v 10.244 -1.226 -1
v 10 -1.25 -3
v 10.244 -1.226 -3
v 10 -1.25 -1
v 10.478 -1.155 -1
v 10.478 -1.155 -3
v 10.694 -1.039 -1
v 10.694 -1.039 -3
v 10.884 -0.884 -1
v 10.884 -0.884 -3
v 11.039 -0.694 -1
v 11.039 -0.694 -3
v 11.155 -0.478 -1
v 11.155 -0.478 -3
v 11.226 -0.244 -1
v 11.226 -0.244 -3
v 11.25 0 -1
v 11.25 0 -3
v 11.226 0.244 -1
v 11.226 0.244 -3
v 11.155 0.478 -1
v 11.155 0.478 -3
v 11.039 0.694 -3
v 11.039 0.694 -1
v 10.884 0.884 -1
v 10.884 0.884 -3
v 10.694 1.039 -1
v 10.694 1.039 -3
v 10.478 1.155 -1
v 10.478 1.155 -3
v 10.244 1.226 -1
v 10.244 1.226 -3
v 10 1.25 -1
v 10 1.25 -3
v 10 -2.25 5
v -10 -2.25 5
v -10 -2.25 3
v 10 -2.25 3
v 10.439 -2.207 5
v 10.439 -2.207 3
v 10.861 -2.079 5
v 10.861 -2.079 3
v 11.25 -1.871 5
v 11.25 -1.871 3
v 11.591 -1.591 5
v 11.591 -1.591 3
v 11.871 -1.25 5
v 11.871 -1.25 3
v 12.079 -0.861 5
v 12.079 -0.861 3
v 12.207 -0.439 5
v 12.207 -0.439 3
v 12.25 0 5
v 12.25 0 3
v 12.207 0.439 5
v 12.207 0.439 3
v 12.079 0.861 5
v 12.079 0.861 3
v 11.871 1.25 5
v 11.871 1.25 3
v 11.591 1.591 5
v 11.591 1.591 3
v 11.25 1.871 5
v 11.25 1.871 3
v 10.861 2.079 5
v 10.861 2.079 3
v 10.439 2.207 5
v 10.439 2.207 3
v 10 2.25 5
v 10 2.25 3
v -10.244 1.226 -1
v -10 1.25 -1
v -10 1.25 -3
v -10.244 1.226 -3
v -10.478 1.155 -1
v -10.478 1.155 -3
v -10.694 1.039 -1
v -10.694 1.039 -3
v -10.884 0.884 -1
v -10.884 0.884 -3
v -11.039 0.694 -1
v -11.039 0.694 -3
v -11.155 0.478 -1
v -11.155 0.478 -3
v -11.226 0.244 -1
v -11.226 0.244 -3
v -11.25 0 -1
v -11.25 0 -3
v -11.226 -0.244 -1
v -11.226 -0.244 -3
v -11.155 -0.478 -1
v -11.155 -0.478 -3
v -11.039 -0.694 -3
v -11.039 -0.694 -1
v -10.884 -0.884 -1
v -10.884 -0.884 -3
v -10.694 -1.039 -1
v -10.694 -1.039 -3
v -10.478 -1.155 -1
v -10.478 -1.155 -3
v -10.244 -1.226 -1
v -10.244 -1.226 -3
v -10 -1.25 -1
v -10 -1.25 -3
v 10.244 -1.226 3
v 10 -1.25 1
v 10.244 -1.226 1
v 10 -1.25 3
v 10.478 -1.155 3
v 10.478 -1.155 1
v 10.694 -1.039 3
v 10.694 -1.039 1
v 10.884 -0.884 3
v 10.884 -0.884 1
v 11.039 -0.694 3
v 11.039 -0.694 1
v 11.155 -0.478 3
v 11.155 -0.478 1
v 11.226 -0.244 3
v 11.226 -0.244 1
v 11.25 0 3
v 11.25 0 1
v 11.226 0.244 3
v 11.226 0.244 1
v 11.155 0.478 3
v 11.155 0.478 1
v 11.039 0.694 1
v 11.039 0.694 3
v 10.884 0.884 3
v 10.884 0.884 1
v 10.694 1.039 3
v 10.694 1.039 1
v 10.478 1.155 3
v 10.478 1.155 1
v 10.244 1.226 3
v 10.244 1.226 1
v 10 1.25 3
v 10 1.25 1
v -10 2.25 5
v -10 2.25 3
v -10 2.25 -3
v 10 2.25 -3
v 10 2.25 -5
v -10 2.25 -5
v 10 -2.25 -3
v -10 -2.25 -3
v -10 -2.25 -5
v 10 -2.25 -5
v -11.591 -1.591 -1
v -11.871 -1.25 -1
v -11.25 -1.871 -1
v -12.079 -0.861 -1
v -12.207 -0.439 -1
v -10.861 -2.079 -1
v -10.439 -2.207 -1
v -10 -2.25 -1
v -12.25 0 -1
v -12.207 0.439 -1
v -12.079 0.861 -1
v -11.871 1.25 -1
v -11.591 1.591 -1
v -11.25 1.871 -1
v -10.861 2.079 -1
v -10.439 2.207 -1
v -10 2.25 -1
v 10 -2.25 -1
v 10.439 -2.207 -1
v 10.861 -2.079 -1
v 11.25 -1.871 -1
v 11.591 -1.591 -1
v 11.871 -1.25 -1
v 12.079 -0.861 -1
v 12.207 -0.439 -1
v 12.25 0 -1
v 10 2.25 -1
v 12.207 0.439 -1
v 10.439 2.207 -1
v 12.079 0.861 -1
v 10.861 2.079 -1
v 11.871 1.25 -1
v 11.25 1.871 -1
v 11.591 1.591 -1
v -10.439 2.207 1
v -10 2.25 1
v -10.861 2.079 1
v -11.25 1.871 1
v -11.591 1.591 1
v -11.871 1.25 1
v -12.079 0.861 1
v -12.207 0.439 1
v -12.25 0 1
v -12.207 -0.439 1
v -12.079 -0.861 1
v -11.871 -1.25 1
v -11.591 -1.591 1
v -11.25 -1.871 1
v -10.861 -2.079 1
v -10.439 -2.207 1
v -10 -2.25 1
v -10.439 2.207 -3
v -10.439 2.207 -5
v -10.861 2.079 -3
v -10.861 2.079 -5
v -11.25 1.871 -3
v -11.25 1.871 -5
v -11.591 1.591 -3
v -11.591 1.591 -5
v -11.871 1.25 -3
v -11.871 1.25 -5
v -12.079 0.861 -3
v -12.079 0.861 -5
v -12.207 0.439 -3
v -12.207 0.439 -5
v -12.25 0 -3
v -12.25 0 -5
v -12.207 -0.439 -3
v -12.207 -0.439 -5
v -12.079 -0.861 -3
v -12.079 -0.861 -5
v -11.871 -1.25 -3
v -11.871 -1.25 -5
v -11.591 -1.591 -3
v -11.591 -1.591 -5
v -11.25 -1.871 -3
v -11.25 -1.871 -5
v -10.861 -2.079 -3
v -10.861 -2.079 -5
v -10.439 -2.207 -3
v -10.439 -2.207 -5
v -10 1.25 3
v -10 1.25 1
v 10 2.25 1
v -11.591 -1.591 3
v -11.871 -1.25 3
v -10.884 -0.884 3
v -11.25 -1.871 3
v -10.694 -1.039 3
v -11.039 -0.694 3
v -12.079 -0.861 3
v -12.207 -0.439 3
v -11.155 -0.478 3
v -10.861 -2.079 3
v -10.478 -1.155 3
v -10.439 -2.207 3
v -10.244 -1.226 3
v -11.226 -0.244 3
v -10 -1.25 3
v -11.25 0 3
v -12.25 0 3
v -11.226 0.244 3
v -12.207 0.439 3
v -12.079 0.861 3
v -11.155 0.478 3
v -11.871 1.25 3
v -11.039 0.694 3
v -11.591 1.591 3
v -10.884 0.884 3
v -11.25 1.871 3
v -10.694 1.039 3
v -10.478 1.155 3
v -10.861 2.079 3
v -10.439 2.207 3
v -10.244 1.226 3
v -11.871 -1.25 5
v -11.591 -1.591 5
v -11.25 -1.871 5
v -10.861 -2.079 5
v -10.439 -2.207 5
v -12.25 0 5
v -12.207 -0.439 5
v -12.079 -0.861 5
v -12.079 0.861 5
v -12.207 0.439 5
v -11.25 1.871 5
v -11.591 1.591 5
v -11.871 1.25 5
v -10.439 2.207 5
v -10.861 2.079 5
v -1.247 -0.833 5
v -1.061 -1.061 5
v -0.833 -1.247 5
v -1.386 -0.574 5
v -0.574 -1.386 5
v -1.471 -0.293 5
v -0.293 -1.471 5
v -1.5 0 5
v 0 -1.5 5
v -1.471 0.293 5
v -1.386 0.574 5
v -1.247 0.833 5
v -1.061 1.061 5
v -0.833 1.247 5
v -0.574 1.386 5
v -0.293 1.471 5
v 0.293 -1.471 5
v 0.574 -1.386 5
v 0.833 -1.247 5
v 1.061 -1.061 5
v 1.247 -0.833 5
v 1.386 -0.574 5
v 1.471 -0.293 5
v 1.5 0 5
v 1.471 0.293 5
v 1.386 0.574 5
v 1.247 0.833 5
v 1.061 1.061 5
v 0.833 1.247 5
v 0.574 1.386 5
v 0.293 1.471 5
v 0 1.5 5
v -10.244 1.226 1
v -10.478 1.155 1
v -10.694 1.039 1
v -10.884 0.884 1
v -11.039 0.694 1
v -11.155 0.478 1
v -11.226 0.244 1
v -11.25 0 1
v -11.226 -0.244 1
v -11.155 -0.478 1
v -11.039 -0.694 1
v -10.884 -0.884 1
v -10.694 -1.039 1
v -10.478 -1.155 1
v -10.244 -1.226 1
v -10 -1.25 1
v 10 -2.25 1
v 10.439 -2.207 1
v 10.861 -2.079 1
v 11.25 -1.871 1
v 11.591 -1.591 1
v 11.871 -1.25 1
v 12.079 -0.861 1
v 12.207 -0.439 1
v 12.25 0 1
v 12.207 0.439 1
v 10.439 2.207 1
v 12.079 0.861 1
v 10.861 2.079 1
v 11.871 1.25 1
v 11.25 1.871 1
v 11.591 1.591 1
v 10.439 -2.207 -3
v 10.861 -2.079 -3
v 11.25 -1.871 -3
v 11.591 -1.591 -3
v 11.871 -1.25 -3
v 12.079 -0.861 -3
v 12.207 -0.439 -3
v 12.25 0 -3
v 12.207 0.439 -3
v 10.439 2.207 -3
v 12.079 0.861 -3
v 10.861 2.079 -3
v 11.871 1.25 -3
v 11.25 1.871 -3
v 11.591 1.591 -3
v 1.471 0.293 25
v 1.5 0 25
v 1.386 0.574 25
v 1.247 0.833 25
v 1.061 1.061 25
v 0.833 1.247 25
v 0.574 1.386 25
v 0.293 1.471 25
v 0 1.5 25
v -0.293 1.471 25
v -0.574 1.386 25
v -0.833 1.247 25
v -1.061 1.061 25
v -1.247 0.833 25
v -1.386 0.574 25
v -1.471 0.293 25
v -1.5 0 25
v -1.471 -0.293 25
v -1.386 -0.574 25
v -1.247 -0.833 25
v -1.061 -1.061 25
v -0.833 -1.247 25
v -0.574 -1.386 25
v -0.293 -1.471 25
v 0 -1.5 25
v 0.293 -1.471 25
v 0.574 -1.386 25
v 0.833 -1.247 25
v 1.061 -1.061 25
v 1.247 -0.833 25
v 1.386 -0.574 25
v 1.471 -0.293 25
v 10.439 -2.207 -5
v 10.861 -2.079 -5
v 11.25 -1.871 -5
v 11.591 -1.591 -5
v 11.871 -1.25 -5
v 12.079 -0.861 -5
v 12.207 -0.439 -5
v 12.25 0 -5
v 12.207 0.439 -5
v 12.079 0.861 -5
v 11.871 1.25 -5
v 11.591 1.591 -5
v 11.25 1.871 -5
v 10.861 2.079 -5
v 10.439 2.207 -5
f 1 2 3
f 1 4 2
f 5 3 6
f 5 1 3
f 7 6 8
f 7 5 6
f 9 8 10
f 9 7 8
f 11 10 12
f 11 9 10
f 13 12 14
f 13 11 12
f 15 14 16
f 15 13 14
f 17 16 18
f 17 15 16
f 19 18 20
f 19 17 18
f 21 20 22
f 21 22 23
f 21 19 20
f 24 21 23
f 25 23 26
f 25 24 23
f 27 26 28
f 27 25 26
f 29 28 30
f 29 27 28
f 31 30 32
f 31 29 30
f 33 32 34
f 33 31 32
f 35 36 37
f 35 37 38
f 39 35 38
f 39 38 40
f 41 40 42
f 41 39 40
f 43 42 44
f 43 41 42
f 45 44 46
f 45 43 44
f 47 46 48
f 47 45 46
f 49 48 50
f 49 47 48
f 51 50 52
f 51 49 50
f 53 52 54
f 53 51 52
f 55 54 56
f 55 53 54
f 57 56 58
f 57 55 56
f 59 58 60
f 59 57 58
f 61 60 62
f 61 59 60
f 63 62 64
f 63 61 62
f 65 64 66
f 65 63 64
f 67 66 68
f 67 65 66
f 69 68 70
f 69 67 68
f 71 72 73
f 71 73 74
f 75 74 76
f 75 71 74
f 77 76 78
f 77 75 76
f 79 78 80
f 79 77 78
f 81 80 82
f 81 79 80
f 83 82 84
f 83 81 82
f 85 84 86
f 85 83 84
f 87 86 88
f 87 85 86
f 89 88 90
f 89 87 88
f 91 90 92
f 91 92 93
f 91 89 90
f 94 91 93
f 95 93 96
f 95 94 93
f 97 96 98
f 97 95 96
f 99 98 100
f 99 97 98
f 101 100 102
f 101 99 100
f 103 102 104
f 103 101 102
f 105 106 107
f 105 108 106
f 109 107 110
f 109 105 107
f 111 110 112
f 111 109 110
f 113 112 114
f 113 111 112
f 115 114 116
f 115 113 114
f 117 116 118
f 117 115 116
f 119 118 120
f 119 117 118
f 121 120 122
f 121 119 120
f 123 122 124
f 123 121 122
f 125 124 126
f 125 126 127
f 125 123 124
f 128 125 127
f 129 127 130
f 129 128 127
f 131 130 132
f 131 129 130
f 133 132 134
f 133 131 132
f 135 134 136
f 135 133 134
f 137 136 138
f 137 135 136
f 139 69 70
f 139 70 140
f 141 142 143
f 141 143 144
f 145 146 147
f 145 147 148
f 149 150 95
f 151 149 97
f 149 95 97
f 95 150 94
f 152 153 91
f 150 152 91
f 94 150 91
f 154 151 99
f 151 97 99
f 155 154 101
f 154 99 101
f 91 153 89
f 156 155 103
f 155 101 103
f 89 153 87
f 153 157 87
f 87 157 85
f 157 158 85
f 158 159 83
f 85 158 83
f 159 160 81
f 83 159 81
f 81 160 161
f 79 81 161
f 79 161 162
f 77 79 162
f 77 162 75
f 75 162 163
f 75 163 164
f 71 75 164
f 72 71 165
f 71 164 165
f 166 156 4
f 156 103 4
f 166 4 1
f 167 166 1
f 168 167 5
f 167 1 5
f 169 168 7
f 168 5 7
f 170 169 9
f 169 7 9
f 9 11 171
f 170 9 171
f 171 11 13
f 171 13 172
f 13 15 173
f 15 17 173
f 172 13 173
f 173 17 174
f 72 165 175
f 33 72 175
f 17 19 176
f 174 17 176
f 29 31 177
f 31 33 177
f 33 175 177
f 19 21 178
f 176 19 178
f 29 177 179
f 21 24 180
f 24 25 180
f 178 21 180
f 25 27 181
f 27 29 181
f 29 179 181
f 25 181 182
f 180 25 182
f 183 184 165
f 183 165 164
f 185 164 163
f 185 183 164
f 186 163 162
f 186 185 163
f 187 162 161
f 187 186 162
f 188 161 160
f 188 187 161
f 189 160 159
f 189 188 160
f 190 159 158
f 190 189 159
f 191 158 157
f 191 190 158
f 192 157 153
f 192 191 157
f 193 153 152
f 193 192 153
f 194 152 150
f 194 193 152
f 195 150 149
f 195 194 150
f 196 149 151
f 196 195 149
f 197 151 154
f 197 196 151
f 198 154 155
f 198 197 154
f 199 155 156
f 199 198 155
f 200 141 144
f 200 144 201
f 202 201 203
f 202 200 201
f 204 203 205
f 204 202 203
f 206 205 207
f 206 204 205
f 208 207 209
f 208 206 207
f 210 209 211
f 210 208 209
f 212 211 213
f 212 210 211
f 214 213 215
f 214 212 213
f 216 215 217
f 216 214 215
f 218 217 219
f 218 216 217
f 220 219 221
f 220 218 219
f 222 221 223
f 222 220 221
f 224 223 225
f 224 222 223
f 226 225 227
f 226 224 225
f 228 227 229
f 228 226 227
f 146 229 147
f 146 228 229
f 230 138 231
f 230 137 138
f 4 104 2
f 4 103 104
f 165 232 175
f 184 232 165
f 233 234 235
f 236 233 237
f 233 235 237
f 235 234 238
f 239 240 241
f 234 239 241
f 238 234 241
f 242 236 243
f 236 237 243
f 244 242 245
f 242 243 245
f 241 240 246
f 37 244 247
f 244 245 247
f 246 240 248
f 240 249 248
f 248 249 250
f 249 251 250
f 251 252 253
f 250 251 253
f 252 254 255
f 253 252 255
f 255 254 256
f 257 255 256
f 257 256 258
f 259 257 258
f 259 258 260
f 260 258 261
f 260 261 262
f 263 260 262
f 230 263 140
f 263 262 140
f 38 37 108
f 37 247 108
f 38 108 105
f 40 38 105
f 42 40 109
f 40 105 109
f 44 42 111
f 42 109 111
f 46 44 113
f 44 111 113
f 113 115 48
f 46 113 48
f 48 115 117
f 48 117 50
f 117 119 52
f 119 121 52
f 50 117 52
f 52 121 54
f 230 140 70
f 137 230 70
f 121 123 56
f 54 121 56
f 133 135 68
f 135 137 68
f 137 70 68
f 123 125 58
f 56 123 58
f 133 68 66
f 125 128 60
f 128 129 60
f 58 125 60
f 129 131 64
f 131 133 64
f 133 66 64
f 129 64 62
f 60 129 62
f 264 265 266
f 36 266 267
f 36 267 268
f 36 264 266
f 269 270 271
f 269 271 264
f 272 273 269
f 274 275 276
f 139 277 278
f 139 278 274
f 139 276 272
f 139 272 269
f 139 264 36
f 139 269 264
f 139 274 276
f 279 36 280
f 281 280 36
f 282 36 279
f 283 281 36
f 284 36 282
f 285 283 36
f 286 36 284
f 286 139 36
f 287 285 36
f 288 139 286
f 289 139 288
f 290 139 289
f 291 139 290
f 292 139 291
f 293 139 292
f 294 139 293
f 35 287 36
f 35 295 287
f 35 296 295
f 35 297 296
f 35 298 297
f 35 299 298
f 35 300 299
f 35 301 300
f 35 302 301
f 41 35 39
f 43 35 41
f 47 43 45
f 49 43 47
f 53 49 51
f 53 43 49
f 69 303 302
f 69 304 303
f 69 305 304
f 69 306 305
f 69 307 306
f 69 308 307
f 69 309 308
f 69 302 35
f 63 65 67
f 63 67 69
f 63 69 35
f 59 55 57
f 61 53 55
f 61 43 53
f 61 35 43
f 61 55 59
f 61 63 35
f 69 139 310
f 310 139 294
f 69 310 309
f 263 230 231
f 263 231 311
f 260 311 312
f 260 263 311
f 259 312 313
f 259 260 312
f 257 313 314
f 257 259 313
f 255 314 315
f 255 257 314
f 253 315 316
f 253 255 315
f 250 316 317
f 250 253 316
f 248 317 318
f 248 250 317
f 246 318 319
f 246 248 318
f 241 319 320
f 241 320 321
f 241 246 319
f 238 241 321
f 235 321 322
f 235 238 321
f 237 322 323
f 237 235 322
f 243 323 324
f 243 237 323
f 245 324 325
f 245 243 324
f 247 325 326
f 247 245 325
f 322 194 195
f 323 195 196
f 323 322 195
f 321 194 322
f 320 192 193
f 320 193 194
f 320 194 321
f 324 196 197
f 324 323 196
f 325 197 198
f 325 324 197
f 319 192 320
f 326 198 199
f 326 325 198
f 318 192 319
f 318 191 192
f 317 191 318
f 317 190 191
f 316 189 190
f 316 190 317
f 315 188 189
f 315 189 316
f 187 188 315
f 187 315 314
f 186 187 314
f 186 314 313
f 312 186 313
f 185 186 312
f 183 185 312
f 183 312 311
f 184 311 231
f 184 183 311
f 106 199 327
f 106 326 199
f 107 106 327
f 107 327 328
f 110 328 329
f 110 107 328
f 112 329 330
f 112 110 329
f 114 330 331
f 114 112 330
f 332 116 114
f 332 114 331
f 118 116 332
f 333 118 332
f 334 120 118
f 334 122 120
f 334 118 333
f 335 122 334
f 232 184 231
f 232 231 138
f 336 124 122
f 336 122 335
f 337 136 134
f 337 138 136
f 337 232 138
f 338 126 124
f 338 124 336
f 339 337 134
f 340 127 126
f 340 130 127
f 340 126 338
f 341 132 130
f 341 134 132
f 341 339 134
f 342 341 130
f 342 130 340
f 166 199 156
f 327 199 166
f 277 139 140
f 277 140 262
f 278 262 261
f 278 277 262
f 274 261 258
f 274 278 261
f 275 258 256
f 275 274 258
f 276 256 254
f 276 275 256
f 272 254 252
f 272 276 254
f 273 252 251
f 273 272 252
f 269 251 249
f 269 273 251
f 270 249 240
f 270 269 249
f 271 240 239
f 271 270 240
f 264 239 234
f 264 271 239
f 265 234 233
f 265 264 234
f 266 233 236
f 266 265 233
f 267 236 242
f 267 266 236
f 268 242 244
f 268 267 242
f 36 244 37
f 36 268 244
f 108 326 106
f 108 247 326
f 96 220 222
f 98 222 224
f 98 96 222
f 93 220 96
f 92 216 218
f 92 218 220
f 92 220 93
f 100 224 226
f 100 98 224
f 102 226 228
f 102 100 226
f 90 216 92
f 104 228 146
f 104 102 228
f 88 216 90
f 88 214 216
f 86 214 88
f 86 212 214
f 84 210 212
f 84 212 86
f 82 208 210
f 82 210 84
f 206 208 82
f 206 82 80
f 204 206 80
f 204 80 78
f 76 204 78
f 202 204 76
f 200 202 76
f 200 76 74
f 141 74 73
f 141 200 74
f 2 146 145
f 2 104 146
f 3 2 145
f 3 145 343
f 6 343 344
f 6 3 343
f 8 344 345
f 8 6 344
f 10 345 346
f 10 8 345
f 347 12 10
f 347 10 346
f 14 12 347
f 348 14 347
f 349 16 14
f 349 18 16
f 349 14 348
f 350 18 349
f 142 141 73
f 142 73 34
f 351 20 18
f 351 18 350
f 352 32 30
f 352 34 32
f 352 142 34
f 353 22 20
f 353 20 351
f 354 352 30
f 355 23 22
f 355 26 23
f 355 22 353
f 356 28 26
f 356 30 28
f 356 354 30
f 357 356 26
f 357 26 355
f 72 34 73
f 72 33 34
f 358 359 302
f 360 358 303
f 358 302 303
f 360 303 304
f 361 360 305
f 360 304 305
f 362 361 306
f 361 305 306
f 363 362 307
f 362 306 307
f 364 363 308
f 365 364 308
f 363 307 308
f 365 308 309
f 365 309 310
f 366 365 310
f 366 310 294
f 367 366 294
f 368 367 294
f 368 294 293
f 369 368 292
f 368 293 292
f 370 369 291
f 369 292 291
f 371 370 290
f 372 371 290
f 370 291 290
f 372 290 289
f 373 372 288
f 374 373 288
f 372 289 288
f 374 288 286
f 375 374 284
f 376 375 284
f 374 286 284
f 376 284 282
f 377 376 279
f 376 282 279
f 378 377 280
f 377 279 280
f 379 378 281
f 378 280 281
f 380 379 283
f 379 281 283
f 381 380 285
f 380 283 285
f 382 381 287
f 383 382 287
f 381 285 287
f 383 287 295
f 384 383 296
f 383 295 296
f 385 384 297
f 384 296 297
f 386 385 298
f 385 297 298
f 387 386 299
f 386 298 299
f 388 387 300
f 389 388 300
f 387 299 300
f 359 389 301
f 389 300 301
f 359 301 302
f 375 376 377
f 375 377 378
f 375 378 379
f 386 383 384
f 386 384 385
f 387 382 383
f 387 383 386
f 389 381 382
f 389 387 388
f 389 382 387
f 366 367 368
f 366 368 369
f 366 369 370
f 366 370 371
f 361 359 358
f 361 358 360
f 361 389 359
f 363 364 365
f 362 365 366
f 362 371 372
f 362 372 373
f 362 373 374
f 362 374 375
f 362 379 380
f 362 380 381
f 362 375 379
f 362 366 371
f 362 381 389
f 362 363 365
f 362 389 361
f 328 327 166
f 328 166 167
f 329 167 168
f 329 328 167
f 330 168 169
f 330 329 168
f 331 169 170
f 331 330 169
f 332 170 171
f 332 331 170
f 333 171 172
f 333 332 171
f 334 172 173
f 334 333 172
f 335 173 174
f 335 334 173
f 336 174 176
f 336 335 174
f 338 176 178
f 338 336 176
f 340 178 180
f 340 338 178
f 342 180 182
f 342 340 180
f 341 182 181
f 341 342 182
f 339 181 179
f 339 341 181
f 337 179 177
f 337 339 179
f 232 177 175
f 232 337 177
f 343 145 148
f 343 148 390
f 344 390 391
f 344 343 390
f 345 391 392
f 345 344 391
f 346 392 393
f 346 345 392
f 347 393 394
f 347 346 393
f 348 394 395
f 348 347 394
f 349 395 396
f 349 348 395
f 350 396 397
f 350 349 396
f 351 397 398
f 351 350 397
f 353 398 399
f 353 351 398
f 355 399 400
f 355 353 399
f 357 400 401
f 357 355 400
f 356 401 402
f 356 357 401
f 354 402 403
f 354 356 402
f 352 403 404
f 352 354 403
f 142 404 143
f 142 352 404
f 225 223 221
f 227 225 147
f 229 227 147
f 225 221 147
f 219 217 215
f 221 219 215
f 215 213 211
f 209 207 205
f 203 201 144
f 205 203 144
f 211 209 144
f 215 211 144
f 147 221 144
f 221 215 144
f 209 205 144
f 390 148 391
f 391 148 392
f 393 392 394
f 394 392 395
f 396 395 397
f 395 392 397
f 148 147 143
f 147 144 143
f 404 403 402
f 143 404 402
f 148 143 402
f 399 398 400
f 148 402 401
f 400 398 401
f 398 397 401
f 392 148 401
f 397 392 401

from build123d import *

# Parameters (mm, degrees)
BOSS_EXTRUDE1_DEPTH = 5
SKETCH4_R           = 1.5
BOSS_EXTRUDE3_DEPTH = 20
CUT_EXTRUDE2_START  = 2
CUT_EXTRUDE2_DEPTH  = 1
CUT_EXTRUDE4_START  = -2
CUT_EXTRUDE4_DEPTH  = 1


with BuildPart() as part:
    # Sketch1 → Boss-Extrude1 (new, symmetric)
    with BuildSketch(Plane.XY):
        with BuildLine():
            Line((10, 2.25), (-10, 2.25))
            ThreePointArc((-10, 2.25), (-12.25, 0), (-10, -2.25))
            Line((-10, -2.25), (10, -2.25))
            ThreePointArc((10, -2.25), (12.25, 0), (10, 2.25))
        make_face()
    extrude(amount=BOSS_EXTRUDE1_DEPTH, both=True)

    # Sketch4 → Boss-Extrude3 (add)
    with BuildSketch(Plane.XY.offset(5)):
        Circle(SKETCH4_R)
    extrude(amount=BOSS_EXTRUDE3_DEPTH)

    # Sketch1<4> → Cut-Extrude2 (cut, symmetric)
    with BuildSketch(Plane.XY.offset(CUT_EXTRUDE2_START)):
        with BuildLine():
            Line((0, 2.25), (-10, 2.25))
            ThreePointArc((-10, 2.25), (-12.25, 0), (-10, -2.25))
            Line((-10, -2.25), (0, -2.25))
            Line((0, -2.25), (10, -2.25))
            ThreePointArc((10, -2.25), (12.25, 0), (10, 2.25))
            Line((10, 2.25), (0, 2.25))
        make_face()
        with BuildLine():
            Line((0, 1.25), (-10, 1.25))
            ThreePointArc((-10, 1.25), (-11.25, 0), (-10, -1.25))
            Line((-10, -1.25), (0, -1.25))
            Line((0, -1.25), (10, -1.25))
            ThreePointArc((10, -1.25), (11.25, 0), (10, 1.25))
            Line((10, 1.25), (0, 1.25))
        make_face(mode=Mode.SUBTRACT)
    extrude(amount=CUT_EXTRUDE2_DEPTH, both=True, mode=Mode.SUBTRACT)

    # Sketch1<6> → Cut-Extrude4 (cut, symmetric)
    with BuildSketch(Plane.XY.offset(CUT_EXTRUDE4_START)):
        with BuildLine():
            Line((0, 2.25), (-10, 2.25))
            ThreePointArc((-10, 2.25), (-12.25, 0), (-10, -2.25))
            Line((-10, -2.25), (0, -2.25))
            Line((0, -2.25), (10, -2.25))
            ThreePointArc((10, -2.25), (12.25, 0), (10, 2.25))
            Line((10, 2.25), (0, 2.25))
        make_face()
        with BuildLine():
            Line((0, 1.25), (-10, 1.25))
            ThreePointArc((-10, 1.25), (-11.25, 0), (-10, -1.25))
            Line((-10, -1.25), (0, -1.25))
            Line((0, -1.25), (10, -1.25))
            ThreePointArc((10, -1.25), (11.25, 0), (10, 1.25))
            Line((10, 1.25), (0, 1.25))
        make_face(mode=Mode.SUBTRACT)
    extrude(amount=CUT_EXTRUDE4_DEPTH, both=True, mode=Mode.SUBTRACT)


solid = part.part
